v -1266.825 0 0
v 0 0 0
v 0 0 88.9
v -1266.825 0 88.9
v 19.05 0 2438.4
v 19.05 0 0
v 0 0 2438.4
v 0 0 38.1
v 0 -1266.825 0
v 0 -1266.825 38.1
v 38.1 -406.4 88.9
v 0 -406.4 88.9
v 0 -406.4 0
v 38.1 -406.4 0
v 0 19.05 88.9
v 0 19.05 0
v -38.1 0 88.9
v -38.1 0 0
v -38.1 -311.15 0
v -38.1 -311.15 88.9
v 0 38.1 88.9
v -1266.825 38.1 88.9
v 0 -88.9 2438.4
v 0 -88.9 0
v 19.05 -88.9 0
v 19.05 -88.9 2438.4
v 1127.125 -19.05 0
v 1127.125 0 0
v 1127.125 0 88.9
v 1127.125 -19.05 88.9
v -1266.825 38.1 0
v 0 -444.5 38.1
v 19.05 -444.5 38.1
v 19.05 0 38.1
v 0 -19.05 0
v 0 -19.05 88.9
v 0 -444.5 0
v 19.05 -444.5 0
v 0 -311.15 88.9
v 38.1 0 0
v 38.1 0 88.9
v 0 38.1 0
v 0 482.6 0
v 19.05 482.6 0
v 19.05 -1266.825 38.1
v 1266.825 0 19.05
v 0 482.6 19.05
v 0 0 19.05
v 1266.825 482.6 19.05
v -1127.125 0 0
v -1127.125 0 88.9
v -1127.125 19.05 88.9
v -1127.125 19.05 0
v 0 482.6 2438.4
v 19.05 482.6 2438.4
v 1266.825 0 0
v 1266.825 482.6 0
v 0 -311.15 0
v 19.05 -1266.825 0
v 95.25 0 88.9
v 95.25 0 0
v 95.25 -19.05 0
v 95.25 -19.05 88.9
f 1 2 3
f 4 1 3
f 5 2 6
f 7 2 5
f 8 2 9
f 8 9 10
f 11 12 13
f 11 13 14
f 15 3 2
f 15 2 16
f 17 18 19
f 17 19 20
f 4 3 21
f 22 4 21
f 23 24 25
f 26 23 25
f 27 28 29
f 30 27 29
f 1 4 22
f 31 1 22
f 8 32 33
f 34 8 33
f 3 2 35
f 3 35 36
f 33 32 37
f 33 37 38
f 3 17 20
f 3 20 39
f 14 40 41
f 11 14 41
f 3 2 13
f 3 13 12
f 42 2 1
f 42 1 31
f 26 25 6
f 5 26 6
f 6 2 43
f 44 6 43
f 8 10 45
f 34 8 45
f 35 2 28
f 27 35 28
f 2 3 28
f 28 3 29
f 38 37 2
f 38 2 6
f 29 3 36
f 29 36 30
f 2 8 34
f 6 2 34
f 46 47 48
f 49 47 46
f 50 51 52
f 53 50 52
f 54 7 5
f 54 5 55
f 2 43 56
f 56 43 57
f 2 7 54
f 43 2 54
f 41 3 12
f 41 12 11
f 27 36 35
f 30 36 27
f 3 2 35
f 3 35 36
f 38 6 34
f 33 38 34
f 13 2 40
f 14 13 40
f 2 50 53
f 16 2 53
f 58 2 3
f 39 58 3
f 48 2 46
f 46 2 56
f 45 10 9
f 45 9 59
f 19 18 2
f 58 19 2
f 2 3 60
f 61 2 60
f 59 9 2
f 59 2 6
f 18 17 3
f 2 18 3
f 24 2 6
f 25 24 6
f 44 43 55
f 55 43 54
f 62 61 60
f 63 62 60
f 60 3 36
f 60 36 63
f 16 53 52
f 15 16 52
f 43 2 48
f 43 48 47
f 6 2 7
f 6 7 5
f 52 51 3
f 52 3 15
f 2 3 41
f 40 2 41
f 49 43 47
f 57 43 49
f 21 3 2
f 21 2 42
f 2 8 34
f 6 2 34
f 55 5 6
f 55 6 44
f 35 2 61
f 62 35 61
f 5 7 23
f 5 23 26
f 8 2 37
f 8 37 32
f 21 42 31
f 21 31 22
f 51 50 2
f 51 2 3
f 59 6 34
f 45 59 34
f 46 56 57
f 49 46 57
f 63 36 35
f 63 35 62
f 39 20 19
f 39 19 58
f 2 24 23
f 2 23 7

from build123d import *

# Parameters (mm, degrees)
F0_W      = 38.1
F0_H      = 88.9
F1_DEPTH  = 311.15
F2_W      = 38.1
F2_H      = 88.9
F3_DEPTH  = 1266.825
F4_W      = 482.6
F4_H      = 2438.4
F5_DEPTH  = 19.05
F6_W      = 38.1
F6_H      = 88.9
F7_DEPTH  = 406.4
F8_W      = 19.05
F8_H      = 88.9
F9_DEPTH  = 1127.125
F10_W     = 19.05
F10_H     = 88.9
F11_DEPTH = 2438.4
F12_W     = 95.25
F12_H     = 88.9
F13_DEPTH = 19.05
F14_W     = 1127.125
F14_H     = 88.9
F15_DEPTH = 19.05
F16_W     = 1266.825
F16_H     = 482.6
F17_DEPTH = 19.05
F18_W     = 19.05
F18_H     = 38.1
F19_DEPTH = 444.5
F20_W     = 19.05
F20_H     = 38.1
F21_DEPTH = 1266.825


with BuildPart() as f1:
    # F0 (on Front) → F1 (new body)
    with BuildSketch(Plane.XZ):
        with Locations((-19.05, 44.45)):
            Rectangle(F0_W, F0_H)
    extrude(amount=F1_DEPTH)


with BuildPart() as f3:
    # F2 (on Right) → F3 (new body)
    with BuildSketch(Plane.YZ):
        with Locations((19.05, 44.45)):
            Rectangle(F2_W, F2_H)
    extrude(amount=-F3_DEPTH)


with BuildPart() as f5:
    # F4 (on Right) → F5 (new body)
    with BuildSketch(Plane.YZ):
        with Locations((241.3, 1219.2)):
            Rectangle(F4_W, F4_H)
    extrude(amount=F5_DEPTH)


with BuildPart() as f7:
    # F6 (on Front) → F7 (new body)
    with BuildSketch(Plane.XZ):
        with Locations((19.05, 44.45)):
            Rectangle(F6_W, F6_H)
    extrude(amount=F7_DEPTH)


with BuildPart() as f9:
    # F8 (on Right) → F9 (new body)
    with BuildSketch(Plane.YZ):
        with Locations((9.525, 44.45)):
            Rectangle(F8_W, F8_H)
    extrude(amount=-F9_DEPTH)


with BuildPart() as f11:
    # F10 (on Top) → F11 (new body)
    with BuildSketch(Plane.XY):
        with Locations((9.525, -44.45)):
            Rectangle(F10_W, F10_H)
    extrude(amount=F11_DEPTH)


with BuildPart() as f13:
    # F12 (on Front) → F13 (new body)
    with BuildSketch(Plane.XZ):
        with Locations((47.625, 44.45)):
            Rectangle(F12_W, F12_H)
    extrude(amount=F13_DEPTH)


with BuildPart() as f15:
    # F14 (on Front) → F15 (new body)
    with BuildSketch(Plane.XZ):
        with Locations((563.5625, 44.45)):
            Rectangle(F14_W, F14_H)
    extrude(amount=F15_DEPTH)


with BuildPart() as f17:
    # F16 (on Top) → F17 (new body)
    with BuildSketch(Plane.XY):
        with Locations((633.4125, 241.3)):
            Rectangle(F16_W, F16_H)
    extrude(amount=F17_DEPTH)


with BuildPart() as f19:
    # F18 (on Front) → F19 (new body)
    with BuildSketch(Plane.XZ):
        with Locations((9.525, 19.05)):
            Rectangle(F18_W, F18_H)
    extrude(amount=F19_DEPTH)


with BuildPart() as f21:
    # F20 (on Front) → F21 (new body)
    with BuildSketch(Plane.XZ):
        with Locations((9.525, 19.05)):
            Rectangle(F20_W, F20_H)
    extrude(amount=F21_DEPTH)


solid = Compound([f1.part, f3.part, f5.part, f7.part, f9.part, f11.part, f13.part, f15.part, f17.part, f19.part, f21.part])
